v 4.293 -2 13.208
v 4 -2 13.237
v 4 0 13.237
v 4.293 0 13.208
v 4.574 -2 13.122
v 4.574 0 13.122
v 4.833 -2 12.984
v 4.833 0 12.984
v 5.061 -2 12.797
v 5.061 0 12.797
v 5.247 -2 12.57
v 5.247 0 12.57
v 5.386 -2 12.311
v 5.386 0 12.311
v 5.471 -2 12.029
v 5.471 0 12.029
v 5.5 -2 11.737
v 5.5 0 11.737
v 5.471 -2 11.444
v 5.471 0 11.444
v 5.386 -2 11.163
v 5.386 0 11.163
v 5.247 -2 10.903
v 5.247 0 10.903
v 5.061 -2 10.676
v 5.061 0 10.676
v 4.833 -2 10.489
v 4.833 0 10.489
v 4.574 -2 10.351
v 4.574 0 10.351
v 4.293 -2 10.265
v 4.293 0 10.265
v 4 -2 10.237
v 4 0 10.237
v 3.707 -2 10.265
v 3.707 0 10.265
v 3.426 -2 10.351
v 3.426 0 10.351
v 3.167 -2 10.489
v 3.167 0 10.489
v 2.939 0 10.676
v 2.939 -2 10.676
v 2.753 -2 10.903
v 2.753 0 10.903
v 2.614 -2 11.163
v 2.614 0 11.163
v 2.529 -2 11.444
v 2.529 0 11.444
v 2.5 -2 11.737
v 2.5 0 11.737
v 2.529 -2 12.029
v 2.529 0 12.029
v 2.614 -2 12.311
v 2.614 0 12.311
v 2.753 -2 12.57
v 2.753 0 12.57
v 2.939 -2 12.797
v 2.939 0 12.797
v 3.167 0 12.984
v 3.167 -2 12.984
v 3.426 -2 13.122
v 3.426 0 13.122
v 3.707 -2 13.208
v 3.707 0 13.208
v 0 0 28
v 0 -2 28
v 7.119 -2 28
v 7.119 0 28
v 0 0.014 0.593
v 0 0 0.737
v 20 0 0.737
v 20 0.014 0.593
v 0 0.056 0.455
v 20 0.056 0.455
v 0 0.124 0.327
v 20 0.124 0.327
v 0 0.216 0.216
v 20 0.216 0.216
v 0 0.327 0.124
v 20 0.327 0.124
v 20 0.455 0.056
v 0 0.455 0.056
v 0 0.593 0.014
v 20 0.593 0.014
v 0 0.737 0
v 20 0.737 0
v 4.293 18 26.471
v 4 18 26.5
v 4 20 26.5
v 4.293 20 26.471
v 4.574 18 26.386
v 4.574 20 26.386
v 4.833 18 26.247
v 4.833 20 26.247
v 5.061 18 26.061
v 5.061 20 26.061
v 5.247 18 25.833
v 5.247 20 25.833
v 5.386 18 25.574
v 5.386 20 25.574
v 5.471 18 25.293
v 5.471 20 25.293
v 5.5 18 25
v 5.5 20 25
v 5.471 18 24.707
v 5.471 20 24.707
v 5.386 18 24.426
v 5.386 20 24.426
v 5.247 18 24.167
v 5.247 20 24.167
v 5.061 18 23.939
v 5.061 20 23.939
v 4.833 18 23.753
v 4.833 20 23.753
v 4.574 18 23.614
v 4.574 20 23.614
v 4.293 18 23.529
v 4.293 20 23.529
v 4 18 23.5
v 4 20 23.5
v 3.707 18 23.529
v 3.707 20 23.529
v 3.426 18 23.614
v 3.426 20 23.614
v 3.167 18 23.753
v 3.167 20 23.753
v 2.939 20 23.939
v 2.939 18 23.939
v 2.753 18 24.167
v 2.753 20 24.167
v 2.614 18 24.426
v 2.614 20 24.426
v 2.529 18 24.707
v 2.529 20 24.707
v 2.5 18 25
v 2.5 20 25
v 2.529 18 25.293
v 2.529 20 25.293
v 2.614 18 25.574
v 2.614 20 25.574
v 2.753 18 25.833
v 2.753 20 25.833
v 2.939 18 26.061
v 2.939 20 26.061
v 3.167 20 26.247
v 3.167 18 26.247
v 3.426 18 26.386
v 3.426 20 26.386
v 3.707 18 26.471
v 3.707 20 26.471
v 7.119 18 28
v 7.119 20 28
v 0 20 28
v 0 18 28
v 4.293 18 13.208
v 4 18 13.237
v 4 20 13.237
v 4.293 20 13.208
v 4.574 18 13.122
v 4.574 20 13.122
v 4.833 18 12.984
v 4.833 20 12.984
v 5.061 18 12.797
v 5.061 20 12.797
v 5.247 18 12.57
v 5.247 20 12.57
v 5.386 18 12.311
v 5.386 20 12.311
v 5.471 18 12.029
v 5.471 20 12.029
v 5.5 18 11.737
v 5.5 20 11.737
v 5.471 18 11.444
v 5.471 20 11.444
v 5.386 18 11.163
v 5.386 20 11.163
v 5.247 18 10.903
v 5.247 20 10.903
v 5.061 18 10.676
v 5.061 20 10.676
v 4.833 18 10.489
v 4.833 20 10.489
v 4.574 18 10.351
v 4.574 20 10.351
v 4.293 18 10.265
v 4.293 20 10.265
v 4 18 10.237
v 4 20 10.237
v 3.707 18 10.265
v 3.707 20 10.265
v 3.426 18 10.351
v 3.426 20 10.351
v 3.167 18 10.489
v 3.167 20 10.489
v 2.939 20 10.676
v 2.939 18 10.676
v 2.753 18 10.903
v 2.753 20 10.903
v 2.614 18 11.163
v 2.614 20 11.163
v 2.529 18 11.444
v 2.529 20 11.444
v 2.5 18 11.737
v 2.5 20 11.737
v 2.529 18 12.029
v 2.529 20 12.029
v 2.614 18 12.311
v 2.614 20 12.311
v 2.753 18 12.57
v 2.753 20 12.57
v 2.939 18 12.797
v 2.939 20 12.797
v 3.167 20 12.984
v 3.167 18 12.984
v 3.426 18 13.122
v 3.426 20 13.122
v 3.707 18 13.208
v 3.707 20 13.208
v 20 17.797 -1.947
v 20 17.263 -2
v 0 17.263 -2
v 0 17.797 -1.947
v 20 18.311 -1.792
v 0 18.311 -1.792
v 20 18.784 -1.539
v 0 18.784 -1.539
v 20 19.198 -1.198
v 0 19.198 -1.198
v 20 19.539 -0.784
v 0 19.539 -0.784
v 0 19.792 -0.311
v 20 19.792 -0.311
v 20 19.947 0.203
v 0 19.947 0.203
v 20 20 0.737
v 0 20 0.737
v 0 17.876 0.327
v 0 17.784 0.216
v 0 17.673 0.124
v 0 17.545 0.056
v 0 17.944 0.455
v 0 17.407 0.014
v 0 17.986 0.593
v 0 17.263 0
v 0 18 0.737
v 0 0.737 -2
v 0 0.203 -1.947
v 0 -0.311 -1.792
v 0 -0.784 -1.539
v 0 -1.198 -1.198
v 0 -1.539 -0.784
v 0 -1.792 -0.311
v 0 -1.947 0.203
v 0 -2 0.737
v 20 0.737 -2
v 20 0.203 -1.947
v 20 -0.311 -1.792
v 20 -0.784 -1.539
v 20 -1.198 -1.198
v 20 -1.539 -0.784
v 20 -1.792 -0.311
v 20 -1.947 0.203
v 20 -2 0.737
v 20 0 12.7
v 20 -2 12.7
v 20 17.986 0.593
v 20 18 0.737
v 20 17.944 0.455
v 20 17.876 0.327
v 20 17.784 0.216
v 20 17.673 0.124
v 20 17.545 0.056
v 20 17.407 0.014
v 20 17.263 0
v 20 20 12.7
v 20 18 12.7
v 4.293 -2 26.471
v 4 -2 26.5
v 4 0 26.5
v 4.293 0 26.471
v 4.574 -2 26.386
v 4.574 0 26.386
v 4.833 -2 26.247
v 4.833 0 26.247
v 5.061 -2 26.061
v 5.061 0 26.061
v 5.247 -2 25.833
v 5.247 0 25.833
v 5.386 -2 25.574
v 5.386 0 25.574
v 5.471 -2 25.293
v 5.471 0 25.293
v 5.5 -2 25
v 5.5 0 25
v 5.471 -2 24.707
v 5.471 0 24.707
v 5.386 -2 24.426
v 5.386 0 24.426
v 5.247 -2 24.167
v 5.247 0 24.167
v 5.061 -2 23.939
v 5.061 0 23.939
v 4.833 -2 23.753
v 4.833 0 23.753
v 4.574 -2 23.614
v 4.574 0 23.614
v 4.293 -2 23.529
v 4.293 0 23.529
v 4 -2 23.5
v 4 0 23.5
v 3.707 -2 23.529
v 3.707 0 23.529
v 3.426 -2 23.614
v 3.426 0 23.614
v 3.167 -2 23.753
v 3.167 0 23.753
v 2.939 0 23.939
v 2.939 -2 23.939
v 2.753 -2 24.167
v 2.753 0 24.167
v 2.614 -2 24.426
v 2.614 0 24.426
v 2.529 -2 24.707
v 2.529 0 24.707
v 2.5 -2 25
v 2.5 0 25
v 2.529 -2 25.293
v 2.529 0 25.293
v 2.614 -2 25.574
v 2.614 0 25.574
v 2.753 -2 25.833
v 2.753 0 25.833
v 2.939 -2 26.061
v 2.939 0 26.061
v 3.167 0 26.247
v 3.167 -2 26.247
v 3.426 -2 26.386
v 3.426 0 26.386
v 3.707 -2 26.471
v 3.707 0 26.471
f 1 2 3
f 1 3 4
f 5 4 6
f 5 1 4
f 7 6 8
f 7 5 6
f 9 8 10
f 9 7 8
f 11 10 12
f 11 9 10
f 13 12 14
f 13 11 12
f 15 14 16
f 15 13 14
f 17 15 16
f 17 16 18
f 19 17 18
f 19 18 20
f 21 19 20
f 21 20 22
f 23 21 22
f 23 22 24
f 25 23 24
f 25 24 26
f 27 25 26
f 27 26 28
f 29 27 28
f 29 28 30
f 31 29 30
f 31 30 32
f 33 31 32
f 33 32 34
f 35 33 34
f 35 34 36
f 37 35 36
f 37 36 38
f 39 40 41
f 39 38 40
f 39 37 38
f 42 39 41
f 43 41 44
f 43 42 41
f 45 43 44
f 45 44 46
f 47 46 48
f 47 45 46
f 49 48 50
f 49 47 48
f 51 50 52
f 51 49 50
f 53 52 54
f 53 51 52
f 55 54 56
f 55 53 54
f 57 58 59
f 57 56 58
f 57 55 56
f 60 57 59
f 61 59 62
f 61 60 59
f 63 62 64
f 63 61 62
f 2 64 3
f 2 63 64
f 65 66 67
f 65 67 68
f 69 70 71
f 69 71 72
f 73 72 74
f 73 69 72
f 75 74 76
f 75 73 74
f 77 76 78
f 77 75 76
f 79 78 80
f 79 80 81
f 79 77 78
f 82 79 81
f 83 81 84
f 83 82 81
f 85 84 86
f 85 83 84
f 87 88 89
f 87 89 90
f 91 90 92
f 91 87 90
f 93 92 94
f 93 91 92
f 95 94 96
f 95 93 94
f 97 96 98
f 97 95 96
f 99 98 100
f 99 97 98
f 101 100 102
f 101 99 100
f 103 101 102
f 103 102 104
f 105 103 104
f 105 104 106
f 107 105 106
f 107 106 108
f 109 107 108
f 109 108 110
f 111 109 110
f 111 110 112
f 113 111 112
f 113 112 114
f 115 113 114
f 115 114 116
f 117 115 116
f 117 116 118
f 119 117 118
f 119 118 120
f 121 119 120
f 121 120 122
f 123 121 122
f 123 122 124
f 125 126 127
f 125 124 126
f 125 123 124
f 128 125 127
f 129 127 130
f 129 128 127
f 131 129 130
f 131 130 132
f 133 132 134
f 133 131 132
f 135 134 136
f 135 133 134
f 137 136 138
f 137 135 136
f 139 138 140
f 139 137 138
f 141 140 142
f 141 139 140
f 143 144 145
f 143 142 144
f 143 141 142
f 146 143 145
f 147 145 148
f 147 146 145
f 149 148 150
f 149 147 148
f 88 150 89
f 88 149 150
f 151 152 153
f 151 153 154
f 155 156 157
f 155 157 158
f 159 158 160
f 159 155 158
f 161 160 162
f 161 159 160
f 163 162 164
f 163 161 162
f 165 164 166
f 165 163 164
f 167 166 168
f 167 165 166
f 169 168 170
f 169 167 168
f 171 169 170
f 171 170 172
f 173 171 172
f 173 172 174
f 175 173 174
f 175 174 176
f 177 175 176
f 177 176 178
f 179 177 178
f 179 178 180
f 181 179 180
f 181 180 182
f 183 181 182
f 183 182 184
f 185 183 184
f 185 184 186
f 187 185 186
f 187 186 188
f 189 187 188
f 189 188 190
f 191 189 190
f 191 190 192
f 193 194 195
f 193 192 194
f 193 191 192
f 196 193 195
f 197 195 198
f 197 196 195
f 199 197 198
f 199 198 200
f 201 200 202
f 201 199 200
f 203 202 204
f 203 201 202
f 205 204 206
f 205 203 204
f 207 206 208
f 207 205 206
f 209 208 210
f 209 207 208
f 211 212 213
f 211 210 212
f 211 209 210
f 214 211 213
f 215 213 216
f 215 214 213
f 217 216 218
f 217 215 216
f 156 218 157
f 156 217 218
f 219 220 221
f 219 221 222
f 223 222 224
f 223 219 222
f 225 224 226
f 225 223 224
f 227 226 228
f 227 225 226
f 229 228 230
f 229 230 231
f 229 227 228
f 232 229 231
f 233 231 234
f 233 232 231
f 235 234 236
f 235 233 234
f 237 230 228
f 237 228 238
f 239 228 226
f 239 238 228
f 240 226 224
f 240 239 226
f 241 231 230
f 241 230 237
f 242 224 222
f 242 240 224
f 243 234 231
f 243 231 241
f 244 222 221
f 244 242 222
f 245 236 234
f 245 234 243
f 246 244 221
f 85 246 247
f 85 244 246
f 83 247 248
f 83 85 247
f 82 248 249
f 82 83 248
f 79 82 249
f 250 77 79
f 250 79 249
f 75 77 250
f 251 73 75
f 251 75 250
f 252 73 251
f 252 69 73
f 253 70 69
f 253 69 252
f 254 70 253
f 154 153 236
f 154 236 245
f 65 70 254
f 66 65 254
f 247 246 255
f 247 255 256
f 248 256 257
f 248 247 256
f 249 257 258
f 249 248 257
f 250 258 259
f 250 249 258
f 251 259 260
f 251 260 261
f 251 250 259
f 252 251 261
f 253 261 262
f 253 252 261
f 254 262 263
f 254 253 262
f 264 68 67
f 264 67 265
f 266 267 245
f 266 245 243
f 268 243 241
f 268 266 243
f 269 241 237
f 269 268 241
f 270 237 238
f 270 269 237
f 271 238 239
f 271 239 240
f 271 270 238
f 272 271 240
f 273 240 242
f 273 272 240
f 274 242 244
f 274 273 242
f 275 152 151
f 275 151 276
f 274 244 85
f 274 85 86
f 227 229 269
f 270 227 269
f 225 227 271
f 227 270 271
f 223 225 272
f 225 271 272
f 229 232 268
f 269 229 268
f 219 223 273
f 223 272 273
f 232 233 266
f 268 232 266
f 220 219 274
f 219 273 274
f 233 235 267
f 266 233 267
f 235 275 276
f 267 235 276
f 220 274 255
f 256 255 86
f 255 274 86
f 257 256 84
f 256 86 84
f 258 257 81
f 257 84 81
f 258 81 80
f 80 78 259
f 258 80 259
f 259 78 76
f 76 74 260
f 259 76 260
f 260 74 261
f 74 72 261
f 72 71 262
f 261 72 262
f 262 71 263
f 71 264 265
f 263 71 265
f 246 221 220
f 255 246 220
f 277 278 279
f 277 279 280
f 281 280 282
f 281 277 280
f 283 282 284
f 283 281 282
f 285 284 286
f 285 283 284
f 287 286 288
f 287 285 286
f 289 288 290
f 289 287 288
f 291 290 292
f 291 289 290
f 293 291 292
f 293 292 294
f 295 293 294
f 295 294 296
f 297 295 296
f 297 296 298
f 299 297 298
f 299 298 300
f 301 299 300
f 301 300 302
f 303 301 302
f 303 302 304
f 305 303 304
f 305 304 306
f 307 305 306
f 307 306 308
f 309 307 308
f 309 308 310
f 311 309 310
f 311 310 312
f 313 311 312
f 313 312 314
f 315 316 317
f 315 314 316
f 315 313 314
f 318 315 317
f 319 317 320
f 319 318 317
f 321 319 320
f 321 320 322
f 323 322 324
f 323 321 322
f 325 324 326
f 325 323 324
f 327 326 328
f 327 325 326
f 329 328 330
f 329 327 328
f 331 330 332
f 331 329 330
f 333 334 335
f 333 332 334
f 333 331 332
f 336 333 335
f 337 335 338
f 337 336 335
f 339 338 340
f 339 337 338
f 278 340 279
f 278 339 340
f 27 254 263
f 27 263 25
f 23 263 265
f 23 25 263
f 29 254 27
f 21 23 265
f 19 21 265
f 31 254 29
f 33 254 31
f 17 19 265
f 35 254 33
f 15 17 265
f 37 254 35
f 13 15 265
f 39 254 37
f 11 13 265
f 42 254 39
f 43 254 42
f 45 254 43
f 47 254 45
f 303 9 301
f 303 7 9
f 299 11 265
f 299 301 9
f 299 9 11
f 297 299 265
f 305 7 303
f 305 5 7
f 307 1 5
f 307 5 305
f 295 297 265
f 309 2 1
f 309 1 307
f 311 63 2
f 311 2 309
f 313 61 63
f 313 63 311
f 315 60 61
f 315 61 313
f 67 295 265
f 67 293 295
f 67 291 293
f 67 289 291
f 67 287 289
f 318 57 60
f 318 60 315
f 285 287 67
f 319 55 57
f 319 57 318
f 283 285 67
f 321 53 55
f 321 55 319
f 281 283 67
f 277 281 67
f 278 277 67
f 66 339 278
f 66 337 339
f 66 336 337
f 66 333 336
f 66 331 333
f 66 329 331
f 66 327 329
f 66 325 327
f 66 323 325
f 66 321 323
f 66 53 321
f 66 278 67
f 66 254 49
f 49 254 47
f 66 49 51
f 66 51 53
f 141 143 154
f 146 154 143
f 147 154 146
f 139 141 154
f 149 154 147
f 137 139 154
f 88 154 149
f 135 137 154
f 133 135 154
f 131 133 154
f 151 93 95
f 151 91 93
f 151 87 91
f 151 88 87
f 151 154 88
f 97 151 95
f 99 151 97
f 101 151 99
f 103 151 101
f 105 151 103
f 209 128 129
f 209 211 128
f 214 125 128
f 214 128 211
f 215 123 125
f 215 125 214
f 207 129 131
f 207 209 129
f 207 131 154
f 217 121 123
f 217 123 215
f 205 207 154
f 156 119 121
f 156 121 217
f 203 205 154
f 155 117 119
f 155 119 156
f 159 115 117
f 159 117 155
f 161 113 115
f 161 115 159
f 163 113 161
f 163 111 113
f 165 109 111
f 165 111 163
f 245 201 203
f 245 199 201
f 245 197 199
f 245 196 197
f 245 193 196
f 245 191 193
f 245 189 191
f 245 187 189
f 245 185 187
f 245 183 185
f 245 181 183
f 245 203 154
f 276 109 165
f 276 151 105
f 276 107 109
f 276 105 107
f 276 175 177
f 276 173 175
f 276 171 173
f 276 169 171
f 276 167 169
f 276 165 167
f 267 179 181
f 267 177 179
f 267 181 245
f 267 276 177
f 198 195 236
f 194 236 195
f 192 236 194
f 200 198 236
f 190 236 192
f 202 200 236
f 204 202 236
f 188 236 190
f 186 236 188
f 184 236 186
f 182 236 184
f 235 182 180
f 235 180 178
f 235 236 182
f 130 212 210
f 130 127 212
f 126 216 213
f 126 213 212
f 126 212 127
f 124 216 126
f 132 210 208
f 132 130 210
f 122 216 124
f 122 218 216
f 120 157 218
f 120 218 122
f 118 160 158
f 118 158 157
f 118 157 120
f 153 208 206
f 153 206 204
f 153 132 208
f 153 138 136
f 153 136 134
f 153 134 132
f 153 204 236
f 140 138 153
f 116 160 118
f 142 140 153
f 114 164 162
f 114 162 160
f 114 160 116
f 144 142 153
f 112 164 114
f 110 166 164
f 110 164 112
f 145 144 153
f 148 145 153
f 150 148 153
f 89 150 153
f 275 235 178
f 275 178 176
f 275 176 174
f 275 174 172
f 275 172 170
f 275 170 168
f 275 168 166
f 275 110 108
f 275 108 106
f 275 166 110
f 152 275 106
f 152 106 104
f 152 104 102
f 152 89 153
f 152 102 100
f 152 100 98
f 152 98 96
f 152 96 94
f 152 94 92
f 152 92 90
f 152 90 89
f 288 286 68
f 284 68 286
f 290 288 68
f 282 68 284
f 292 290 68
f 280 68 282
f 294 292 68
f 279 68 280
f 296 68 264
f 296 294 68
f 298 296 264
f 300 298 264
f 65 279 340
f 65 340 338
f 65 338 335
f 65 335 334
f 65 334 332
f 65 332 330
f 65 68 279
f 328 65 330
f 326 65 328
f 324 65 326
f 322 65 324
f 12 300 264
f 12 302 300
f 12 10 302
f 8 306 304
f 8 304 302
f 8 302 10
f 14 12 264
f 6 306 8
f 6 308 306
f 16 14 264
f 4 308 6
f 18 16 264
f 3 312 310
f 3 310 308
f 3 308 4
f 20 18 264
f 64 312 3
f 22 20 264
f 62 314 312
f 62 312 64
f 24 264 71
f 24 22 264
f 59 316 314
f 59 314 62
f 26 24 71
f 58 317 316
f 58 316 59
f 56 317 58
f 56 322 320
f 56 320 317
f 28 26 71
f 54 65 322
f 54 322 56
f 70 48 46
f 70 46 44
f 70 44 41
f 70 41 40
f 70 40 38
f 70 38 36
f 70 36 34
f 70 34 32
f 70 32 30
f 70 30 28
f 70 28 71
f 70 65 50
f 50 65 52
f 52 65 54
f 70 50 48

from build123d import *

# Parameters (mm, degrees)
SCHIZZO1_W                       = 20
SCHIZZO1_H                       = 18
BASE_FLANGIA1_DEPTH              = 2
BORDO_FLANGIA3_STRIP_W           = 9.4732
BORDO_FLANGIA3_STRIP_H           = 2
BORDO_FLANGIA3_STRIP_CUT_DEPTH   = 20
BORDO_FLANGIA3_STRIP_2_W         = 9.4732
BORDO_FLANGIA3_STRIP_2_H         = 2
BORDO_FLANGIA3_STRIP_CUT_2_DEPTH = 20
BORDO_FLANGIA3_DEPTH             = 20
BORDO_FLANGIA3_BEND_DEPTH        = 20
TAGLIO_ESTRUSIONE1_DEPTH         = 41.841155713
TAGLIO_ESTRUSIONE1_DEPTH_BACK    = 41.841155713
TAGLIO_ESTRUSIONE2_DEPTH         = 41.841155713
TAGLIO_ESTRUSIONE2_DEPTH_BACK    = 41.841155713
SCHIZZO20_R                      = 1.5


# Sheet-metal steps are written as plain solids
with BuildPart() as part:
    # Schizzo1 → Base-Flangia1 (new body)
    with BuildSketch(Plane.XY):
        with Locations((10, 9)):
            Rectangle(SCHIZZO1_W, SCHIZZO1_H)
    extrude(amount=-BASE_FLANGIA1_DEPTH)

    # Bordo-Flangia3 strip (across the edge) → Bordo-Flangia3 strip cut (cut)
    with BuildSketch(Plane(origin=(20, 18, 0), x_dir=(0, -1, 0), z_dir=(-1, 0, 0))):
        with Locations((-4, -1)):
            Rectangle(BORDO_FLANGIA3_STRIP_W, BORDO_FLANGIA3_STRIP_H)
    extrude(amount=BORDO_FLANGIA3_STRIP_CUT_DEPTH, mode=Mode.SUBTRACT)

    # Bordo-Flangia3 strip 2 (across the edge) → Bordo-Flangia3 strip cut 2 (cut)
    with BuildSketch(Plane.YZ):
        with Locations((-4, -1)):
            Rectangle(BORDO_FLANGIA3_STRIP_2_W, BORDO_FLANGIA3_STRIP_2_H)
    extrude(amount=BORDO_FLANGIA3_STRIP_CUT_2_DEPTH, mode=Mode.SUBTRACT)

    # Bordo-Flangia3 section (across the edge) → Bordo-Flangia3 (add)
    with BuildSketch(Plane(origin=(20, 18, 0), x_dir=(0, -1, 0), z_dir=(-1, 0, 0))):
        with BuildLine():
            Line((-2, 0.7366), (-2, 28))
            Line((-2, 28), (0, 28))
            Line((0, 28), (0, 0.7366))
            ThreePointArc((0, 0.7366), (0.215745145, 0.215745145), (0.7366, 0))
            Line((0.7366, 0), (0.7366, -2))
            ThreePointArc((0.7366, -2), (-1.198468417, -1.198468417), (-2, 0.7366))
        make_face()
    extrude(amount=BORDO_FLANGIA3_DEPTH)

    # Bordo-Flangia3 section 2 (across the edge) → Bordo-Flangia3 bend (add)
    with BuildSketch(Plane.YZ):
        with BuildLine():
            Line((-2, 0.7366), (-2, 28))
            Line((-2, 28), (0, 28))
            Line((0, 28), (0, 0.7366))
            ThreePointArc((0, 0.7366), (0.215745145, 0.215745145), (0.7366, 0))
            Line((0.7366, 0), (0.7366, -2))
            ThreePointArc((0.7366, -2), (-1.198468417, -1.198468417), (-2, 0.7366))
        make_face()
    extrude(amount=BORDO_FLANGIA3_BEND_DEPTH)

    # Schizzo19 → Taglio-Estrusione1 (cut, two sides: drawn at the far end of the back side and taken through both)
    with BuildSketch(Plane.XZ.offset(2).offset(-TAGLIO_ESTRUSIONE1_DEPTH_BACK)):
        Polygon((7.119394424, 28), (20, 12.7), (20, 28), align=None)
    extrude(amount=TAGLIO_ESTRUSIONE1_DEPTH + TAGLIO_ESTRUSIONE1_DEPTH_BACK, mode=Mode.SUBTRACT)

    # Schizzo20 → Taglio-Estrusione2 (cut, two sides: drawn at the far end of the back side and taken through both)
    with BuildSketch(Plane(origin=(0, 20, 0), x_dir=(1, 0, 0), z_dir=(0, 1, 0)).offset(-TAGLIO_ESTRUSIONE2_DEPTH_BACK)):
        with Locations(Location((4, -11.7366, 0), (0, 0, 270))):
            Circle(SCHIZZO20_R)
        with Locations(Location((4, -25, 0), (0, 0, 270))):
            Circle(SCHIZZO20_R)
    extrude(amount=TAGLIO_ESTRUSIONE2_DEPTH + TAGLIO_ESTRUSIONE2_DEPTH_BACK, mode=Mode.SUBTRACT)


solid = part.part
